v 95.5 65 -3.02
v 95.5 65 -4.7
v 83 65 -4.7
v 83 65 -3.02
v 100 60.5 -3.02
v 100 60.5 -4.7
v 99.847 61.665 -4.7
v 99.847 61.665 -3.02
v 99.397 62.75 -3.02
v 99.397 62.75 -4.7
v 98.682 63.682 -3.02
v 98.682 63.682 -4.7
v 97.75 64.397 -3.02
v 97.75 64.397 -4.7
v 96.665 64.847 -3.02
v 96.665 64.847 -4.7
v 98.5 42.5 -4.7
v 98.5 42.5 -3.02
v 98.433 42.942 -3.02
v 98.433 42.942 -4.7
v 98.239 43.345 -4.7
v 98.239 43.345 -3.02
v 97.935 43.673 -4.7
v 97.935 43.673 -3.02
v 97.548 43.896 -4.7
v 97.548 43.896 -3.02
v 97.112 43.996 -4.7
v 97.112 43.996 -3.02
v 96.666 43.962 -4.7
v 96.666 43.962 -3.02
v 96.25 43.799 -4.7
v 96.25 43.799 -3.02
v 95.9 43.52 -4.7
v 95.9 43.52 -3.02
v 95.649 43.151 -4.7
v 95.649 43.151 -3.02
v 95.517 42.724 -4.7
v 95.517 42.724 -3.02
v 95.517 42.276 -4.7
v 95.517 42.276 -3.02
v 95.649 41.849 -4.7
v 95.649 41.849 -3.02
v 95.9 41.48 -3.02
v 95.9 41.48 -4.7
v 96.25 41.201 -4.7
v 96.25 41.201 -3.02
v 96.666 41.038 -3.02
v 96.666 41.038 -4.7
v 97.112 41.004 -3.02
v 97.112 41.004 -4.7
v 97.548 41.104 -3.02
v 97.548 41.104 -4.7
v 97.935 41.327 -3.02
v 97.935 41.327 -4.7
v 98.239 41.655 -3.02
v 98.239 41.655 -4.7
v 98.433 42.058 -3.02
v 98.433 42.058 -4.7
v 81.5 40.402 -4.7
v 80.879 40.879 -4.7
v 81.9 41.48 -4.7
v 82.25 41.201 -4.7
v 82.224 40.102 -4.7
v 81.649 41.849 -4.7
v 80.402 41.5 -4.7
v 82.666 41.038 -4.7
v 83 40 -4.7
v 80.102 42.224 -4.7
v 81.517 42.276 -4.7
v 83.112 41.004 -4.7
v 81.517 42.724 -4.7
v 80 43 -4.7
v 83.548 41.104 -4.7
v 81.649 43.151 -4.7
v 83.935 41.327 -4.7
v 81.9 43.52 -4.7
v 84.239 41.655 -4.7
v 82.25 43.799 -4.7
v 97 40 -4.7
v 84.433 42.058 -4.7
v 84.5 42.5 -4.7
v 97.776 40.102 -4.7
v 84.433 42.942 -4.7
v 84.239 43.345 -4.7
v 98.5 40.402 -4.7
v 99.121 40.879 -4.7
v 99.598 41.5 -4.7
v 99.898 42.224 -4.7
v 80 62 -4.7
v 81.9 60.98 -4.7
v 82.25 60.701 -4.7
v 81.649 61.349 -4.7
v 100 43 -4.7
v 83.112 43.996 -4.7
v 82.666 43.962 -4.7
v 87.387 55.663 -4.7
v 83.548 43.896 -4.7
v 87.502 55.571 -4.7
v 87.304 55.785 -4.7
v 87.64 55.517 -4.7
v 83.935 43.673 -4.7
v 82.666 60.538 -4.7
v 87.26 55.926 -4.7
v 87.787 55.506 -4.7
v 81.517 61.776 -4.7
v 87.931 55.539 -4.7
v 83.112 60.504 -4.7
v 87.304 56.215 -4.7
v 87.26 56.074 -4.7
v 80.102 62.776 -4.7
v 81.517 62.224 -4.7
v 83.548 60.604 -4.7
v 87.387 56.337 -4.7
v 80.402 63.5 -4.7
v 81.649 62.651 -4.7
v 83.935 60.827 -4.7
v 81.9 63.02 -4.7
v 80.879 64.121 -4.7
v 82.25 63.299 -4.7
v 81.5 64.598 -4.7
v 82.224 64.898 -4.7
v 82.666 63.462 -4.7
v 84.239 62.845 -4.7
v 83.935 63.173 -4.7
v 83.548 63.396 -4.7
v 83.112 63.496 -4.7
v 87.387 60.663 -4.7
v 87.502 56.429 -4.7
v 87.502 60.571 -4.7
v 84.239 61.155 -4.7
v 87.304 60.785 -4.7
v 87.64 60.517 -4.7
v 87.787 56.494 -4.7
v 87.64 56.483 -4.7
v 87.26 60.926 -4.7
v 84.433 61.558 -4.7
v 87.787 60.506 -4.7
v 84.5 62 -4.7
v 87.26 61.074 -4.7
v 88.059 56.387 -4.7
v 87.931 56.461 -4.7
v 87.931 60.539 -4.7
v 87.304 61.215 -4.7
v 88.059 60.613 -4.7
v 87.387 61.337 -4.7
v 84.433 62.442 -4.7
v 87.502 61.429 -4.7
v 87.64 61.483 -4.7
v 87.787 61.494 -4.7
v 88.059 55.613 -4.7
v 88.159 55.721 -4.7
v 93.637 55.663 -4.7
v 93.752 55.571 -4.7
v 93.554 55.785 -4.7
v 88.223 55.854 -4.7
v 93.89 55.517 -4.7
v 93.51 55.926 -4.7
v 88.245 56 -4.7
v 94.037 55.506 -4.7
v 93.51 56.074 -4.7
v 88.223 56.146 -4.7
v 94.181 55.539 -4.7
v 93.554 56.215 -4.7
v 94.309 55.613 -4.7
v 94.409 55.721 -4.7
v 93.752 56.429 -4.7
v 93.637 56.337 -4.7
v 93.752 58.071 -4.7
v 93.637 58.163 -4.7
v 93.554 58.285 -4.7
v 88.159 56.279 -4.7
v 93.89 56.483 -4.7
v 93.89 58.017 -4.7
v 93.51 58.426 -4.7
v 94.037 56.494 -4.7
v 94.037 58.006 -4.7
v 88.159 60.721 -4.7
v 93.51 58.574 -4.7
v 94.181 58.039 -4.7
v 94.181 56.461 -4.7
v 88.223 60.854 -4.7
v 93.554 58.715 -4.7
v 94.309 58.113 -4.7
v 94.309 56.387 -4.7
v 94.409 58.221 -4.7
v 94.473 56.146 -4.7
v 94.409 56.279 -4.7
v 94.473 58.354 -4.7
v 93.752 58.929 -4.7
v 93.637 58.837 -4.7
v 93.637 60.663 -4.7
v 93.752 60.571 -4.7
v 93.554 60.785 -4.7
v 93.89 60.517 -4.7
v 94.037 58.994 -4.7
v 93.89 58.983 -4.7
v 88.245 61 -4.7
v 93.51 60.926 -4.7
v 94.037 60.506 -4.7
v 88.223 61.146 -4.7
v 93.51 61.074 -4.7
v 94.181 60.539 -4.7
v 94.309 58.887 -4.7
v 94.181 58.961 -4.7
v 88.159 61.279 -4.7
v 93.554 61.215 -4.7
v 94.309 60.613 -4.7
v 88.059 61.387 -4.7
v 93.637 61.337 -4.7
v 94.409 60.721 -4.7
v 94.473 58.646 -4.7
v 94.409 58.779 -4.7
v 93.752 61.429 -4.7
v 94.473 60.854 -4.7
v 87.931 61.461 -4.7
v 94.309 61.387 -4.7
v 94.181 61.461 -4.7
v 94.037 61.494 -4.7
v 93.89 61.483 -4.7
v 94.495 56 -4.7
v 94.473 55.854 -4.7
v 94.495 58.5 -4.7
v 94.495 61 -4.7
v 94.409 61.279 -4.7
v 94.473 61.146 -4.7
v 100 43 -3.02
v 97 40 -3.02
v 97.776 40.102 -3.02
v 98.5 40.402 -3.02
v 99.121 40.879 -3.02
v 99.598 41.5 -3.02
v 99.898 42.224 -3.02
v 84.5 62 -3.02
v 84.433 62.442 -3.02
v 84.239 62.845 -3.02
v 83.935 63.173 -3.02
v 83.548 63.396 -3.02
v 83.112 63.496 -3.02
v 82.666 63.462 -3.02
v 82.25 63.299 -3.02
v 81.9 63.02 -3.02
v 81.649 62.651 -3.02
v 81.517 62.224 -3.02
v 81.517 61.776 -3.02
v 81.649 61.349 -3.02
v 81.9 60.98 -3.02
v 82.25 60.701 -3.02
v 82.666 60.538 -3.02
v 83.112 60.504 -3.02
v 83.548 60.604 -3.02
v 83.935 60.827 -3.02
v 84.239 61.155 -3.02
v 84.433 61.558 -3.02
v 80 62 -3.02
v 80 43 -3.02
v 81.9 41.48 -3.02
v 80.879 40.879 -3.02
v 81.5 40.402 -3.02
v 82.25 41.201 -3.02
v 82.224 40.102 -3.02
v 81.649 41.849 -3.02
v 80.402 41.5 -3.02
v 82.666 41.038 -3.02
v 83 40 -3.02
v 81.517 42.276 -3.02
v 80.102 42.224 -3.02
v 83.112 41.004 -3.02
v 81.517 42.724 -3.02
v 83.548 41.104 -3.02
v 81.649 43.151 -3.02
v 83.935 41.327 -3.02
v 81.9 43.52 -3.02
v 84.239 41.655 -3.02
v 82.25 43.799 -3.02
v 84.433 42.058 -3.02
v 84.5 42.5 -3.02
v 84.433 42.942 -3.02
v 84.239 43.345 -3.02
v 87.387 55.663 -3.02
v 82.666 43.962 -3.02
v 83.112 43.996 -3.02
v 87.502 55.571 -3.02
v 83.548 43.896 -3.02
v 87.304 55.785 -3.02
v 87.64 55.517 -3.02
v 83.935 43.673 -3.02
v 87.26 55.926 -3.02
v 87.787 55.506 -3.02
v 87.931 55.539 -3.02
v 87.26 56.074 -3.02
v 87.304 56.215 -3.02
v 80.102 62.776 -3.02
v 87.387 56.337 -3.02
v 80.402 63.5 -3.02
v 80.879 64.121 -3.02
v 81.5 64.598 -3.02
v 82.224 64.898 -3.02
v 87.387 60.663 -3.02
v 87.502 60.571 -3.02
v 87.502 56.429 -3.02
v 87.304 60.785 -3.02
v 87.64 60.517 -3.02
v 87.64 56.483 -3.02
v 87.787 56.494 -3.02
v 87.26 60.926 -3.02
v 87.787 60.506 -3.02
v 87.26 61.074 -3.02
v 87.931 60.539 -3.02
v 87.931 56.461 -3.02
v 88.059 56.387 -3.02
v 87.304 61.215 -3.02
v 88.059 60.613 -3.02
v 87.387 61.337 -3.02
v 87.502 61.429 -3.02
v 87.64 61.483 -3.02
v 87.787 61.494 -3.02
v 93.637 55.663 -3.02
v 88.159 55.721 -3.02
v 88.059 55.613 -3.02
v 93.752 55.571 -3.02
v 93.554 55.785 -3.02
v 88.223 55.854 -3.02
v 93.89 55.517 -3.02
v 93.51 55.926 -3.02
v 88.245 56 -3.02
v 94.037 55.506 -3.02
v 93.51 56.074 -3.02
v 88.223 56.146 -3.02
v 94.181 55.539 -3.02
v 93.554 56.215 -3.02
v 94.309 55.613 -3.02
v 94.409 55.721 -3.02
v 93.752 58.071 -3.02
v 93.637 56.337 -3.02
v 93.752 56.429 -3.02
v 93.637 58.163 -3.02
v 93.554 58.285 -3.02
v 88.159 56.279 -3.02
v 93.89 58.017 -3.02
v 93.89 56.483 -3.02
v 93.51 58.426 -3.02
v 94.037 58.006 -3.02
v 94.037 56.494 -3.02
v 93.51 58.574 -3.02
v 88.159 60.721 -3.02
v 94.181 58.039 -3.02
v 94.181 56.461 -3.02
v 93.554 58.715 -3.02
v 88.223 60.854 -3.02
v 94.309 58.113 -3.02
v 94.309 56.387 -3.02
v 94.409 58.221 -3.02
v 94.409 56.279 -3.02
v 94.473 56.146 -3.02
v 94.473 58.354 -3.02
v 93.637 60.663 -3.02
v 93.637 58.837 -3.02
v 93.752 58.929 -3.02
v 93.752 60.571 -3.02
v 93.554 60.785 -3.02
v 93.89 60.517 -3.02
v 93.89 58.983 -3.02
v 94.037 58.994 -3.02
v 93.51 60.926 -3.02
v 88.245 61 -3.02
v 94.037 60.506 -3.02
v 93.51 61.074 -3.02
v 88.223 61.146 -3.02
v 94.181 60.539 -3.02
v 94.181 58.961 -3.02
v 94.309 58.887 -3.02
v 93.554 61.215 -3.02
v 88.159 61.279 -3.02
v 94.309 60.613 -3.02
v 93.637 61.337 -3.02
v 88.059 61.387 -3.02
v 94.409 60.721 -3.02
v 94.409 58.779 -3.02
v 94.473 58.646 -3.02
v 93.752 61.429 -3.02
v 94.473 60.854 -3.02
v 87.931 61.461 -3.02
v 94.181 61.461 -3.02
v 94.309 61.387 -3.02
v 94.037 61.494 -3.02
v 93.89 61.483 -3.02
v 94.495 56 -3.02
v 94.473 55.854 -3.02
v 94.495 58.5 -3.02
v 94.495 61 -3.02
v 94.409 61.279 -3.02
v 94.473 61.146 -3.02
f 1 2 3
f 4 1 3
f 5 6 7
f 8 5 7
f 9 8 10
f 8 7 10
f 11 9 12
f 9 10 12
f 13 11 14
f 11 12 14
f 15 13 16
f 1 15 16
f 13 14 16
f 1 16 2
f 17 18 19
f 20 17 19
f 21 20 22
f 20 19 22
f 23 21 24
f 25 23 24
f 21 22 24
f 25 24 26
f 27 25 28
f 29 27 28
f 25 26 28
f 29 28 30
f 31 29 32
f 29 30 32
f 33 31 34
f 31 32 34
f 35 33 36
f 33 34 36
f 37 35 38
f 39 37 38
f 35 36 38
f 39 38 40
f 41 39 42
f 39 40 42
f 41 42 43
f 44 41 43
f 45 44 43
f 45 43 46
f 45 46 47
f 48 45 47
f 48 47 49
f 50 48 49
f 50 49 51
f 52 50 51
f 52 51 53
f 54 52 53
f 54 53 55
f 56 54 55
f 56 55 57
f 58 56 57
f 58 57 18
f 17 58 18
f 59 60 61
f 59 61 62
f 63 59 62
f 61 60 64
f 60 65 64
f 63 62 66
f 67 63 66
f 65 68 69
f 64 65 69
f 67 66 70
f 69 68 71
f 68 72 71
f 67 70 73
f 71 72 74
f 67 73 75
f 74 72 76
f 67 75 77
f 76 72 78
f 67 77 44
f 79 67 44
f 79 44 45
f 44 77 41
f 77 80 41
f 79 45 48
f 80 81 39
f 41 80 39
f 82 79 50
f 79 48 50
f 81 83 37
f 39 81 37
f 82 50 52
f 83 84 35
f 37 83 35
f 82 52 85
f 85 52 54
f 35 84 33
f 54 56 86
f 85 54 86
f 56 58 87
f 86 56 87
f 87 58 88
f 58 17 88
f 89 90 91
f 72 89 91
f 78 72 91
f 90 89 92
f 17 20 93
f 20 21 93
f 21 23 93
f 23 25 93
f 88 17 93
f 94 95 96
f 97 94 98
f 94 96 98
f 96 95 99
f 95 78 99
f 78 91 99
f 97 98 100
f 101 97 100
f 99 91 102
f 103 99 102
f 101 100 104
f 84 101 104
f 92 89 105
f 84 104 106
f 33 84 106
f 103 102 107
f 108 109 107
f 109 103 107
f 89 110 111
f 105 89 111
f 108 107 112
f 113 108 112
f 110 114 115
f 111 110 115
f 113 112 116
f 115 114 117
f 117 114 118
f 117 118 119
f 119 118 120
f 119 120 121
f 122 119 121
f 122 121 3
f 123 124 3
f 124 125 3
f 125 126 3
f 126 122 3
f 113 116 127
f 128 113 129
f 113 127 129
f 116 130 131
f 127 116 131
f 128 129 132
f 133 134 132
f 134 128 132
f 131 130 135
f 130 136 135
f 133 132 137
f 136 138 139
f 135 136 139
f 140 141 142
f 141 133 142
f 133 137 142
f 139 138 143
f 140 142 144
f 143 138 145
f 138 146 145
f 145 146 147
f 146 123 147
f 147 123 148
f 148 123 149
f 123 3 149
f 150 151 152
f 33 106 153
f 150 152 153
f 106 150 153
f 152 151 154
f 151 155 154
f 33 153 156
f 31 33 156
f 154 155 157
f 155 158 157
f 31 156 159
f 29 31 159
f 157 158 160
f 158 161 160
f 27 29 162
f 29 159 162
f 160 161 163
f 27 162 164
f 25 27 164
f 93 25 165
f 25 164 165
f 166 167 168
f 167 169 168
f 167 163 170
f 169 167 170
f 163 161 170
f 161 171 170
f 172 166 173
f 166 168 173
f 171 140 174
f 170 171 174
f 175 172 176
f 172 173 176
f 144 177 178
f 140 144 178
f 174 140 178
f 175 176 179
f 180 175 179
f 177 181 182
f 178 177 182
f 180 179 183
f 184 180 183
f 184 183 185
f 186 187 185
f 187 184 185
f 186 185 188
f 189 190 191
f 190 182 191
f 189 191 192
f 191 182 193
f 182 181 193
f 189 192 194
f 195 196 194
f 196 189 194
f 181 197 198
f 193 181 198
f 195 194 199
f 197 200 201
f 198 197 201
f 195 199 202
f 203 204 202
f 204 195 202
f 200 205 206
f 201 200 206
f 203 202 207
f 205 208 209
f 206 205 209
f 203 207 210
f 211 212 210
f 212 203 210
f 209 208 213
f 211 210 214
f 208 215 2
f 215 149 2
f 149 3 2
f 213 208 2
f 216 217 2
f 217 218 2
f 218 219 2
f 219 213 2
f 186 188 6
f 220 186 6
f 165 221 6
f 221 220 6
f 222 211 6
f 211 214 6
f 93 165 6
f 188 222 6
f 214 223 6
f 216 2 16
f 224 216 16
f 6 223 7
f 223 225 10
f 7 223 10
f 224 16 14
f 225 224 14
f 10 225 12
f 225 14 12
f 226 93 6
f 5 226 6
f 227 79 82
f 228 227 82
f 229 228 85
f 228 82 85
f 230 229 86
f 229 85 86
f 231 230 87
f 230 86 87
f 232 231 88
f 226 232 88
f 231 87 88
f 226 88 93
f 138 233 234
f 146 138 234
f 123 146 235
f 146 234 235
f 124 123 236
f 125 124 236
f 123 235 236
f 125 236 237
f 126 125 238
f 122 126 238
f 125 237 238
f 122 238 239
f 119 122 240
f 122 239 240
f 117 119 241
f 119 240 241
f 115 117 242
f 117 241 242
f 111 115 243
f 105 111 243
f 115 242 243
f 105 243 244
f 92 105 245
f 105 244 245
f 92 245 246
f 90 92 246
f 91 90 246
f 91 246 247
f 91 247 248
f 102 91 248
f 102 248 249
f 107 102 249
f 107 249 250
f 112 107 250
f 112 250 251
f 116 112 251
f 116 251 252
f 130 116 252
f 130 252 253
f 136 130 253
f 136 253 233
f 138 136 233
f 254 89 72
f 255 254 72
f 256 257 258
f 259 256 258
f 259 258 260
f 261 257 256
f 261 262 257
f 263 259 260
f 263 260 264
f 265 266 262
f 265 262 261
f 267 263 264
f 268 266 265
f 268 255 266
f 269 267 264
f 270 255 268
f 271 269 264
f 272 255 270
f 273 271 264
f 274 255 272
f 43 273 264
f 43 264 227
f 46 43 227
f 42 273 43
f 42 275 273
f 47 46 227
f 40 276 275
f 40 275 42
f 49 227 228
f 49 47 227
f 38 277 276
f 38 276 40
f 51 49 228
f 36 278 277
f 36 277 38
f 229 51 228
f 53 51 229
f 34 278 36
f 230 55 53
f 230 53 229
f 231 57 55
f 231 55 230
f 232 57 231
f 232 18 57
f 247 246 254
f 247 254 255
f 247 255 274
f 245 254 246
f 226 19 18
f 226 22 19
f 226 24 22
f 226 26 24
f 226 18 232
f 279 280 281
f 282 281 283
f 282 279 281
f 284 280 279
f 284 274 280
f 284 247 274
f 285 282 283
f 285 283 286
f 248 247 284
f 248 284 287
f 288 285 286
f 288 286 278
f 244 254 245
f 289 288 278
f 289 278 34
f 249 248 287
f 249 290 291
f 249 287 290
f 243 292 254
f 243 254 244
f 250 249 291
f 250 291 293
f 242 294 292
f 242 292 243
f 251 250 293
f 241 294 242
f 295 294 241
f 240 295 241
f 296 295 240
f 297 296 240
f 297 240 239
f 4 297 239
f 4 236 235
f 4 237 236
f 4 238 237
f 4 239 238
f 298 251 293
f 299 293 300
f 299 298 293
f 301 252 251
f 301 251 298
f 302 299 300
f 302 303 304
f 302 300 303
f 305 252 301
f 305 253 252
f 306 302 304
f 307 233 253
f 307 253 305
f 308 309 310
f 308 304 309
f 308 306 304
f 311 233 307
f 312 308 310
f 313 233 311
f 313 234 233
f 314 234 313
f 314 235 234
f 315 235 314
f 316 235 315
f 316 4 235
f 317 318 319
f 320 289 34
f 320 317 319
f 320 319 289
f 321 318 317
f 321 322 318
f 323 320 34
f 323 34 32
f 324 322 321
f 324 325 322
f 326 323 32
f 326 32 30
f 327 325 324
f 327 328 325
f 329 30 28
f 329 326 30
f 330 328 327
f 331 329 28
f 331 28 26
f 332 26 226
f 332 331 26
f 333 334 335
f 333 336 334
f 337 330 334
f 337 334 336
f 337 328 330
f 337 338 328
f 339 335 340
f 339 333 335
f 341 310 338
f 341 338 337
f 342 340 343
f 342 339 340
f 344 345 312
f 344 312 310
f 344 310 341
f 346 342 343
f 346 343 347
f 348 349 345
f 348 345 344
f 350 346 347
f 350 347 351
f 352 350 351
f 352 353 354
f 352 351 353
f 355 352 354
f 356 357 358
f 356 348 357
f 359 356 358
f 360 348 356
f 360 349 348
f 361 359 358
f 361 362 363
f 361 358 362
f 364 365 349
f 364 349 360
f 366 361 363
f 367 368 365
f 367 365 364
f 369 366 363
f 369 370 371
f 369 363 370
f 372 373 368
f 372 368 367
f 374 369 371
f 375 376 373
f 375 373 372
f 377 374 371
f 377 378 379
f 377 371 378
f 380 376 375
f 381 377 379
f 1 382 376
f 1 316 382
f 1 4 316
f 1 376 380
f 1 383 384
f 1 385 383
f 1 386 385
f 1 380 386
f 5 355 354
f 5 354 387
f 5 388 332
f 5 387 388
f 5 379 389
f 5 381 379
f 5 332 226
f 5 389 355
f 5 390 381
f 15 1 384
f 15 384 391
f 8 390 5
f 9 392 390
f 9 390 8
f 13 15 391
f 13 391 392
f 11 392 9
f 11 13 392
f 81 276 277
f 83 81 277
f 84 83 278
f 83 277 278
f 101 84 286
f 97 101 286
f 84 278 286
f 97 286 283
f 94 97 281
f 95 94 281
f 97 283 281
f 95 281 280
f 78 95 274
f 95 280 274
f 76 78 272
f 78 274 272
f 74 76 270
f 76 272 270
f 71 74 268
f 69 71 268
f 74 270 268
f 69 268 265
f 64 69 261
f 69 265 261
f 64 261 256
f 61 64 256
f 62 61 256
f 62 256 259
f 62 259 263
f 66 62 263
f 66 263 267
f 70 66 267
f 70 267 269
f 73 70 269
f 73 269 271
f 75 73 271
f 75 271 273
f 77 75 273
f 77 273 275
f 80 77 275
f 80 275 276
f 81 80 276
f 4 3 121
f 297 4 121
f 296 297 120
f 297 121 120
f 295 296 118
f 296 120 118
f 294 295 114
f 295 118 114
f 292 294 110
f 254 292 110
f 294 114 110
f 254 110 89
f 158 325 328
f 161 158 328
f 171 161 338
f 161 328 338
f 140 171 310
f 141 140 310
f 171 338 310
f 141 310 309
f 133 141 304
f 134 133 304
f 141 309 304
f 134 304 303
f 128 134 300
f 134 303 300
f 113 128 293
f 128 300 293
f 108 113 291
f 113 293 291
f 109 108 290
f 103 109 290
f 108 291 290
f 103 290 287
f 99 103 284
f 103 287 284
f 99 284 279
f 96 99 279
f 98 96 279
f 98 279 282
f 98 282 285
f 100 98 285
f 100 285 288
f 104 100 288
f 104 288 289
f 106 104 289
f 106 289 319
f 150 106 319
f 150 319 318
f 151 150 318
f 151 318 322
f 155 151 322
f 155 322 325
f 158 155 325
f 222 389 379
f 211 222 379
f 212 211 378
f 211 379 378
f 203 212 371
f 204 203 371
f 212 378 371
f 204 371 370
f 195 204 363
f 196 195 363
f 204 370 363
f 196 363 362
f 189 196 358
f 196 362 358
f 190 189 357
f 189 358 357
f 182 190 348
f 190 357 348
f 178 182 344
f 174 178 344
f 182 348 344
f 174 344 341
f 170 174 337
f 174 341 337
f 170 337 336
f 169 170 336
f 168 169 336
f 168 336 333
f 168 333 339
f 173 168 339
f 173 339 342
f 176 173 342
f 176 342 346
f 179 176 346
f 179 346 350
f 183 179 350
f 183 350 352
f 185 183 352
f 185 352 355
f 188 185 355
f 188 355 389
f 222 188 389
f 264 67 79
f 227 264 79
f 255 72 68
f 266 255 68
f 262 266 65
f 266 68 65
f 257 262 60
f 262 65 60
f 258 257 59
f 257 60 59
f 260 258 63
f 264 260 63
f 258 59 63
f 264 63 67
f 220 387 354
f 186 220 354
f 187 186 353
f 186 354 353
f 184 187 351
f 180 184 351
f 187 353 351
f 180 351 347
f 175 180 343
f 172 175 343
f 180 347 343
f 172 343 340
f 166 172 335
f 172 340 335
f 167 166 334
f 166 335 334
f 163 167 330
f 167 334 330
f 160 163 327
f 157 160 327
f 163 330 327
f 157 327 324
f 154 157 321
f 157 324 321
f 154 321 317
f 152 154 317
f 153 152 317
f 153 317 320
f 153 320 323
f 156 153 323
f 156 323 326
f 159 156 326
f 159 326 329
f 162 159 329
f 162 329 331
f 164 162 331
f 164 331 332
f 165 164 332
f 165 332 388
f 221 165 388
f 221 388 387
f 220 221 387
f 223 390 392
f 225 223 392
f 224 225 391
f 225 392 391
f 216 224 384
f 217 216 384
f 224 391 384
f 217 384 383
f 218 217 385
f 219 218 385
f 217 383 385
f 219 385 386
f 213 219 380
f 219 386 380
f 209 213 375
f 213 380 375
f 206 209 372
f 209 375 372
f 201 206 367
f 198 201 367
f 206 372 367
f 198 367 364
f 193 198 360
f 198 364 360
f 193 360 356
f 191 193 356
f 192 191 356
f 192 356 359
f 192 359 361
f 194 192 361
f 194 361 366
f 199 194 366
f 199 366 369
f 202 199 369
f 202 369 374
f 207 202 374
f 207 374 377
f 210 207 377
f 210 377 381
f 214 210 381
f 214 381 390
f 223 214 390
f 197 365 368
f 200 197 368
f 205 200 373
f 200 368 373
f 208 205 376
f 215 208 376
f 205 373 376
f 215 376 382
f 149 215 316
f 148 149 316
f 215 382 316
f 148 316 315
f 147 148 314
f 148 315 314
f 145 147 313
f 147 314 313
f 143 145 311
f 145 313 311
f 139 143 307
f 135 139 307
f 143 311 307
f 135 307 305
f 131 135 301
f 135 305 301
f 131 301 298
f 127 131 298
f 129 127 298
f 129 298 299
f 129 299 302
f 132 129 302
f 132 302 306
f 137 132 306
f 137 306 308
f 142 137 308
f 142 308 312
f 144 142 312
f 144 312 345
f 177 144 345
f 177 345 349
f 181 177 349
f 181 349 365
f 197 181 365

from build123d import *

# Parameters (mm, degrees)
BOARD_DEPTH        = 1.68
SKETCH2_R          = 1.5
SKETCH2_R_2        = 0.4953
PLATED_HOLES_DEPTH = 5.7


with BuildPart() as part:
    # Sketch1 → BOARD (new body)
    with BuildSketch(Plane.XY.offset(-4.7)):
        with BuildLine():
            Line((100, 43), (100, 60.5))
            ThreePointArc((100, 60.5), (98.681980515, 63.681980515), (95.5, 65))
            Line((95.5, 65), (83, 65))
            ThreePointArc((83, 65), (80.878679656, 64.121320344), (80, 62))
            Line((80, 62), (80, 43))
            ThreePointArc((80, 43), (80.878679656, 40.878679656), (83, 40))
            Line((83, 40), (97, 40))
            ThreePointArc((97, 40), (99.121320344, 40.878679656), (100, 43))
        make_face()
    extrude(amount=BOARD_DEPTH)

    # Sketch2 → PLATED HOLES (cut, through all)
    with BuildSketch(Plane.XY):
        with Locations((83, 42.5)):
            Circle(SKETCH2_R)
        with Locations((97, 42.5)):
            Circle(SKETCH2_R)
        with Locations((97, 35.5)):
            Circle(SKETCH2_R)
        with Locations((83, 62)):
            Circle(SKETCH2_R)
        with Locations((87.749999989, 55.999999989)):
            Circle(SKETCH2_R_2)
        with Locations((87.749999989, 60.999999996)):
            Circle(SKETCH2_R_2)
        with Locations((94.000000011, 58.499999992)):
            Circle(SKETCH2_R_2)
        with Locations((94.000000011, 55.999999989)):
            Circle(SKETCH2_R_2)
        with Locations((94.000000011, 60.999999996)):
            Circle(SKETCH2_R_2)
    extrude(amount=-PLATED_HOLES_DEPTH, mode=Mode.SUBTRACT)


solid = part.part
